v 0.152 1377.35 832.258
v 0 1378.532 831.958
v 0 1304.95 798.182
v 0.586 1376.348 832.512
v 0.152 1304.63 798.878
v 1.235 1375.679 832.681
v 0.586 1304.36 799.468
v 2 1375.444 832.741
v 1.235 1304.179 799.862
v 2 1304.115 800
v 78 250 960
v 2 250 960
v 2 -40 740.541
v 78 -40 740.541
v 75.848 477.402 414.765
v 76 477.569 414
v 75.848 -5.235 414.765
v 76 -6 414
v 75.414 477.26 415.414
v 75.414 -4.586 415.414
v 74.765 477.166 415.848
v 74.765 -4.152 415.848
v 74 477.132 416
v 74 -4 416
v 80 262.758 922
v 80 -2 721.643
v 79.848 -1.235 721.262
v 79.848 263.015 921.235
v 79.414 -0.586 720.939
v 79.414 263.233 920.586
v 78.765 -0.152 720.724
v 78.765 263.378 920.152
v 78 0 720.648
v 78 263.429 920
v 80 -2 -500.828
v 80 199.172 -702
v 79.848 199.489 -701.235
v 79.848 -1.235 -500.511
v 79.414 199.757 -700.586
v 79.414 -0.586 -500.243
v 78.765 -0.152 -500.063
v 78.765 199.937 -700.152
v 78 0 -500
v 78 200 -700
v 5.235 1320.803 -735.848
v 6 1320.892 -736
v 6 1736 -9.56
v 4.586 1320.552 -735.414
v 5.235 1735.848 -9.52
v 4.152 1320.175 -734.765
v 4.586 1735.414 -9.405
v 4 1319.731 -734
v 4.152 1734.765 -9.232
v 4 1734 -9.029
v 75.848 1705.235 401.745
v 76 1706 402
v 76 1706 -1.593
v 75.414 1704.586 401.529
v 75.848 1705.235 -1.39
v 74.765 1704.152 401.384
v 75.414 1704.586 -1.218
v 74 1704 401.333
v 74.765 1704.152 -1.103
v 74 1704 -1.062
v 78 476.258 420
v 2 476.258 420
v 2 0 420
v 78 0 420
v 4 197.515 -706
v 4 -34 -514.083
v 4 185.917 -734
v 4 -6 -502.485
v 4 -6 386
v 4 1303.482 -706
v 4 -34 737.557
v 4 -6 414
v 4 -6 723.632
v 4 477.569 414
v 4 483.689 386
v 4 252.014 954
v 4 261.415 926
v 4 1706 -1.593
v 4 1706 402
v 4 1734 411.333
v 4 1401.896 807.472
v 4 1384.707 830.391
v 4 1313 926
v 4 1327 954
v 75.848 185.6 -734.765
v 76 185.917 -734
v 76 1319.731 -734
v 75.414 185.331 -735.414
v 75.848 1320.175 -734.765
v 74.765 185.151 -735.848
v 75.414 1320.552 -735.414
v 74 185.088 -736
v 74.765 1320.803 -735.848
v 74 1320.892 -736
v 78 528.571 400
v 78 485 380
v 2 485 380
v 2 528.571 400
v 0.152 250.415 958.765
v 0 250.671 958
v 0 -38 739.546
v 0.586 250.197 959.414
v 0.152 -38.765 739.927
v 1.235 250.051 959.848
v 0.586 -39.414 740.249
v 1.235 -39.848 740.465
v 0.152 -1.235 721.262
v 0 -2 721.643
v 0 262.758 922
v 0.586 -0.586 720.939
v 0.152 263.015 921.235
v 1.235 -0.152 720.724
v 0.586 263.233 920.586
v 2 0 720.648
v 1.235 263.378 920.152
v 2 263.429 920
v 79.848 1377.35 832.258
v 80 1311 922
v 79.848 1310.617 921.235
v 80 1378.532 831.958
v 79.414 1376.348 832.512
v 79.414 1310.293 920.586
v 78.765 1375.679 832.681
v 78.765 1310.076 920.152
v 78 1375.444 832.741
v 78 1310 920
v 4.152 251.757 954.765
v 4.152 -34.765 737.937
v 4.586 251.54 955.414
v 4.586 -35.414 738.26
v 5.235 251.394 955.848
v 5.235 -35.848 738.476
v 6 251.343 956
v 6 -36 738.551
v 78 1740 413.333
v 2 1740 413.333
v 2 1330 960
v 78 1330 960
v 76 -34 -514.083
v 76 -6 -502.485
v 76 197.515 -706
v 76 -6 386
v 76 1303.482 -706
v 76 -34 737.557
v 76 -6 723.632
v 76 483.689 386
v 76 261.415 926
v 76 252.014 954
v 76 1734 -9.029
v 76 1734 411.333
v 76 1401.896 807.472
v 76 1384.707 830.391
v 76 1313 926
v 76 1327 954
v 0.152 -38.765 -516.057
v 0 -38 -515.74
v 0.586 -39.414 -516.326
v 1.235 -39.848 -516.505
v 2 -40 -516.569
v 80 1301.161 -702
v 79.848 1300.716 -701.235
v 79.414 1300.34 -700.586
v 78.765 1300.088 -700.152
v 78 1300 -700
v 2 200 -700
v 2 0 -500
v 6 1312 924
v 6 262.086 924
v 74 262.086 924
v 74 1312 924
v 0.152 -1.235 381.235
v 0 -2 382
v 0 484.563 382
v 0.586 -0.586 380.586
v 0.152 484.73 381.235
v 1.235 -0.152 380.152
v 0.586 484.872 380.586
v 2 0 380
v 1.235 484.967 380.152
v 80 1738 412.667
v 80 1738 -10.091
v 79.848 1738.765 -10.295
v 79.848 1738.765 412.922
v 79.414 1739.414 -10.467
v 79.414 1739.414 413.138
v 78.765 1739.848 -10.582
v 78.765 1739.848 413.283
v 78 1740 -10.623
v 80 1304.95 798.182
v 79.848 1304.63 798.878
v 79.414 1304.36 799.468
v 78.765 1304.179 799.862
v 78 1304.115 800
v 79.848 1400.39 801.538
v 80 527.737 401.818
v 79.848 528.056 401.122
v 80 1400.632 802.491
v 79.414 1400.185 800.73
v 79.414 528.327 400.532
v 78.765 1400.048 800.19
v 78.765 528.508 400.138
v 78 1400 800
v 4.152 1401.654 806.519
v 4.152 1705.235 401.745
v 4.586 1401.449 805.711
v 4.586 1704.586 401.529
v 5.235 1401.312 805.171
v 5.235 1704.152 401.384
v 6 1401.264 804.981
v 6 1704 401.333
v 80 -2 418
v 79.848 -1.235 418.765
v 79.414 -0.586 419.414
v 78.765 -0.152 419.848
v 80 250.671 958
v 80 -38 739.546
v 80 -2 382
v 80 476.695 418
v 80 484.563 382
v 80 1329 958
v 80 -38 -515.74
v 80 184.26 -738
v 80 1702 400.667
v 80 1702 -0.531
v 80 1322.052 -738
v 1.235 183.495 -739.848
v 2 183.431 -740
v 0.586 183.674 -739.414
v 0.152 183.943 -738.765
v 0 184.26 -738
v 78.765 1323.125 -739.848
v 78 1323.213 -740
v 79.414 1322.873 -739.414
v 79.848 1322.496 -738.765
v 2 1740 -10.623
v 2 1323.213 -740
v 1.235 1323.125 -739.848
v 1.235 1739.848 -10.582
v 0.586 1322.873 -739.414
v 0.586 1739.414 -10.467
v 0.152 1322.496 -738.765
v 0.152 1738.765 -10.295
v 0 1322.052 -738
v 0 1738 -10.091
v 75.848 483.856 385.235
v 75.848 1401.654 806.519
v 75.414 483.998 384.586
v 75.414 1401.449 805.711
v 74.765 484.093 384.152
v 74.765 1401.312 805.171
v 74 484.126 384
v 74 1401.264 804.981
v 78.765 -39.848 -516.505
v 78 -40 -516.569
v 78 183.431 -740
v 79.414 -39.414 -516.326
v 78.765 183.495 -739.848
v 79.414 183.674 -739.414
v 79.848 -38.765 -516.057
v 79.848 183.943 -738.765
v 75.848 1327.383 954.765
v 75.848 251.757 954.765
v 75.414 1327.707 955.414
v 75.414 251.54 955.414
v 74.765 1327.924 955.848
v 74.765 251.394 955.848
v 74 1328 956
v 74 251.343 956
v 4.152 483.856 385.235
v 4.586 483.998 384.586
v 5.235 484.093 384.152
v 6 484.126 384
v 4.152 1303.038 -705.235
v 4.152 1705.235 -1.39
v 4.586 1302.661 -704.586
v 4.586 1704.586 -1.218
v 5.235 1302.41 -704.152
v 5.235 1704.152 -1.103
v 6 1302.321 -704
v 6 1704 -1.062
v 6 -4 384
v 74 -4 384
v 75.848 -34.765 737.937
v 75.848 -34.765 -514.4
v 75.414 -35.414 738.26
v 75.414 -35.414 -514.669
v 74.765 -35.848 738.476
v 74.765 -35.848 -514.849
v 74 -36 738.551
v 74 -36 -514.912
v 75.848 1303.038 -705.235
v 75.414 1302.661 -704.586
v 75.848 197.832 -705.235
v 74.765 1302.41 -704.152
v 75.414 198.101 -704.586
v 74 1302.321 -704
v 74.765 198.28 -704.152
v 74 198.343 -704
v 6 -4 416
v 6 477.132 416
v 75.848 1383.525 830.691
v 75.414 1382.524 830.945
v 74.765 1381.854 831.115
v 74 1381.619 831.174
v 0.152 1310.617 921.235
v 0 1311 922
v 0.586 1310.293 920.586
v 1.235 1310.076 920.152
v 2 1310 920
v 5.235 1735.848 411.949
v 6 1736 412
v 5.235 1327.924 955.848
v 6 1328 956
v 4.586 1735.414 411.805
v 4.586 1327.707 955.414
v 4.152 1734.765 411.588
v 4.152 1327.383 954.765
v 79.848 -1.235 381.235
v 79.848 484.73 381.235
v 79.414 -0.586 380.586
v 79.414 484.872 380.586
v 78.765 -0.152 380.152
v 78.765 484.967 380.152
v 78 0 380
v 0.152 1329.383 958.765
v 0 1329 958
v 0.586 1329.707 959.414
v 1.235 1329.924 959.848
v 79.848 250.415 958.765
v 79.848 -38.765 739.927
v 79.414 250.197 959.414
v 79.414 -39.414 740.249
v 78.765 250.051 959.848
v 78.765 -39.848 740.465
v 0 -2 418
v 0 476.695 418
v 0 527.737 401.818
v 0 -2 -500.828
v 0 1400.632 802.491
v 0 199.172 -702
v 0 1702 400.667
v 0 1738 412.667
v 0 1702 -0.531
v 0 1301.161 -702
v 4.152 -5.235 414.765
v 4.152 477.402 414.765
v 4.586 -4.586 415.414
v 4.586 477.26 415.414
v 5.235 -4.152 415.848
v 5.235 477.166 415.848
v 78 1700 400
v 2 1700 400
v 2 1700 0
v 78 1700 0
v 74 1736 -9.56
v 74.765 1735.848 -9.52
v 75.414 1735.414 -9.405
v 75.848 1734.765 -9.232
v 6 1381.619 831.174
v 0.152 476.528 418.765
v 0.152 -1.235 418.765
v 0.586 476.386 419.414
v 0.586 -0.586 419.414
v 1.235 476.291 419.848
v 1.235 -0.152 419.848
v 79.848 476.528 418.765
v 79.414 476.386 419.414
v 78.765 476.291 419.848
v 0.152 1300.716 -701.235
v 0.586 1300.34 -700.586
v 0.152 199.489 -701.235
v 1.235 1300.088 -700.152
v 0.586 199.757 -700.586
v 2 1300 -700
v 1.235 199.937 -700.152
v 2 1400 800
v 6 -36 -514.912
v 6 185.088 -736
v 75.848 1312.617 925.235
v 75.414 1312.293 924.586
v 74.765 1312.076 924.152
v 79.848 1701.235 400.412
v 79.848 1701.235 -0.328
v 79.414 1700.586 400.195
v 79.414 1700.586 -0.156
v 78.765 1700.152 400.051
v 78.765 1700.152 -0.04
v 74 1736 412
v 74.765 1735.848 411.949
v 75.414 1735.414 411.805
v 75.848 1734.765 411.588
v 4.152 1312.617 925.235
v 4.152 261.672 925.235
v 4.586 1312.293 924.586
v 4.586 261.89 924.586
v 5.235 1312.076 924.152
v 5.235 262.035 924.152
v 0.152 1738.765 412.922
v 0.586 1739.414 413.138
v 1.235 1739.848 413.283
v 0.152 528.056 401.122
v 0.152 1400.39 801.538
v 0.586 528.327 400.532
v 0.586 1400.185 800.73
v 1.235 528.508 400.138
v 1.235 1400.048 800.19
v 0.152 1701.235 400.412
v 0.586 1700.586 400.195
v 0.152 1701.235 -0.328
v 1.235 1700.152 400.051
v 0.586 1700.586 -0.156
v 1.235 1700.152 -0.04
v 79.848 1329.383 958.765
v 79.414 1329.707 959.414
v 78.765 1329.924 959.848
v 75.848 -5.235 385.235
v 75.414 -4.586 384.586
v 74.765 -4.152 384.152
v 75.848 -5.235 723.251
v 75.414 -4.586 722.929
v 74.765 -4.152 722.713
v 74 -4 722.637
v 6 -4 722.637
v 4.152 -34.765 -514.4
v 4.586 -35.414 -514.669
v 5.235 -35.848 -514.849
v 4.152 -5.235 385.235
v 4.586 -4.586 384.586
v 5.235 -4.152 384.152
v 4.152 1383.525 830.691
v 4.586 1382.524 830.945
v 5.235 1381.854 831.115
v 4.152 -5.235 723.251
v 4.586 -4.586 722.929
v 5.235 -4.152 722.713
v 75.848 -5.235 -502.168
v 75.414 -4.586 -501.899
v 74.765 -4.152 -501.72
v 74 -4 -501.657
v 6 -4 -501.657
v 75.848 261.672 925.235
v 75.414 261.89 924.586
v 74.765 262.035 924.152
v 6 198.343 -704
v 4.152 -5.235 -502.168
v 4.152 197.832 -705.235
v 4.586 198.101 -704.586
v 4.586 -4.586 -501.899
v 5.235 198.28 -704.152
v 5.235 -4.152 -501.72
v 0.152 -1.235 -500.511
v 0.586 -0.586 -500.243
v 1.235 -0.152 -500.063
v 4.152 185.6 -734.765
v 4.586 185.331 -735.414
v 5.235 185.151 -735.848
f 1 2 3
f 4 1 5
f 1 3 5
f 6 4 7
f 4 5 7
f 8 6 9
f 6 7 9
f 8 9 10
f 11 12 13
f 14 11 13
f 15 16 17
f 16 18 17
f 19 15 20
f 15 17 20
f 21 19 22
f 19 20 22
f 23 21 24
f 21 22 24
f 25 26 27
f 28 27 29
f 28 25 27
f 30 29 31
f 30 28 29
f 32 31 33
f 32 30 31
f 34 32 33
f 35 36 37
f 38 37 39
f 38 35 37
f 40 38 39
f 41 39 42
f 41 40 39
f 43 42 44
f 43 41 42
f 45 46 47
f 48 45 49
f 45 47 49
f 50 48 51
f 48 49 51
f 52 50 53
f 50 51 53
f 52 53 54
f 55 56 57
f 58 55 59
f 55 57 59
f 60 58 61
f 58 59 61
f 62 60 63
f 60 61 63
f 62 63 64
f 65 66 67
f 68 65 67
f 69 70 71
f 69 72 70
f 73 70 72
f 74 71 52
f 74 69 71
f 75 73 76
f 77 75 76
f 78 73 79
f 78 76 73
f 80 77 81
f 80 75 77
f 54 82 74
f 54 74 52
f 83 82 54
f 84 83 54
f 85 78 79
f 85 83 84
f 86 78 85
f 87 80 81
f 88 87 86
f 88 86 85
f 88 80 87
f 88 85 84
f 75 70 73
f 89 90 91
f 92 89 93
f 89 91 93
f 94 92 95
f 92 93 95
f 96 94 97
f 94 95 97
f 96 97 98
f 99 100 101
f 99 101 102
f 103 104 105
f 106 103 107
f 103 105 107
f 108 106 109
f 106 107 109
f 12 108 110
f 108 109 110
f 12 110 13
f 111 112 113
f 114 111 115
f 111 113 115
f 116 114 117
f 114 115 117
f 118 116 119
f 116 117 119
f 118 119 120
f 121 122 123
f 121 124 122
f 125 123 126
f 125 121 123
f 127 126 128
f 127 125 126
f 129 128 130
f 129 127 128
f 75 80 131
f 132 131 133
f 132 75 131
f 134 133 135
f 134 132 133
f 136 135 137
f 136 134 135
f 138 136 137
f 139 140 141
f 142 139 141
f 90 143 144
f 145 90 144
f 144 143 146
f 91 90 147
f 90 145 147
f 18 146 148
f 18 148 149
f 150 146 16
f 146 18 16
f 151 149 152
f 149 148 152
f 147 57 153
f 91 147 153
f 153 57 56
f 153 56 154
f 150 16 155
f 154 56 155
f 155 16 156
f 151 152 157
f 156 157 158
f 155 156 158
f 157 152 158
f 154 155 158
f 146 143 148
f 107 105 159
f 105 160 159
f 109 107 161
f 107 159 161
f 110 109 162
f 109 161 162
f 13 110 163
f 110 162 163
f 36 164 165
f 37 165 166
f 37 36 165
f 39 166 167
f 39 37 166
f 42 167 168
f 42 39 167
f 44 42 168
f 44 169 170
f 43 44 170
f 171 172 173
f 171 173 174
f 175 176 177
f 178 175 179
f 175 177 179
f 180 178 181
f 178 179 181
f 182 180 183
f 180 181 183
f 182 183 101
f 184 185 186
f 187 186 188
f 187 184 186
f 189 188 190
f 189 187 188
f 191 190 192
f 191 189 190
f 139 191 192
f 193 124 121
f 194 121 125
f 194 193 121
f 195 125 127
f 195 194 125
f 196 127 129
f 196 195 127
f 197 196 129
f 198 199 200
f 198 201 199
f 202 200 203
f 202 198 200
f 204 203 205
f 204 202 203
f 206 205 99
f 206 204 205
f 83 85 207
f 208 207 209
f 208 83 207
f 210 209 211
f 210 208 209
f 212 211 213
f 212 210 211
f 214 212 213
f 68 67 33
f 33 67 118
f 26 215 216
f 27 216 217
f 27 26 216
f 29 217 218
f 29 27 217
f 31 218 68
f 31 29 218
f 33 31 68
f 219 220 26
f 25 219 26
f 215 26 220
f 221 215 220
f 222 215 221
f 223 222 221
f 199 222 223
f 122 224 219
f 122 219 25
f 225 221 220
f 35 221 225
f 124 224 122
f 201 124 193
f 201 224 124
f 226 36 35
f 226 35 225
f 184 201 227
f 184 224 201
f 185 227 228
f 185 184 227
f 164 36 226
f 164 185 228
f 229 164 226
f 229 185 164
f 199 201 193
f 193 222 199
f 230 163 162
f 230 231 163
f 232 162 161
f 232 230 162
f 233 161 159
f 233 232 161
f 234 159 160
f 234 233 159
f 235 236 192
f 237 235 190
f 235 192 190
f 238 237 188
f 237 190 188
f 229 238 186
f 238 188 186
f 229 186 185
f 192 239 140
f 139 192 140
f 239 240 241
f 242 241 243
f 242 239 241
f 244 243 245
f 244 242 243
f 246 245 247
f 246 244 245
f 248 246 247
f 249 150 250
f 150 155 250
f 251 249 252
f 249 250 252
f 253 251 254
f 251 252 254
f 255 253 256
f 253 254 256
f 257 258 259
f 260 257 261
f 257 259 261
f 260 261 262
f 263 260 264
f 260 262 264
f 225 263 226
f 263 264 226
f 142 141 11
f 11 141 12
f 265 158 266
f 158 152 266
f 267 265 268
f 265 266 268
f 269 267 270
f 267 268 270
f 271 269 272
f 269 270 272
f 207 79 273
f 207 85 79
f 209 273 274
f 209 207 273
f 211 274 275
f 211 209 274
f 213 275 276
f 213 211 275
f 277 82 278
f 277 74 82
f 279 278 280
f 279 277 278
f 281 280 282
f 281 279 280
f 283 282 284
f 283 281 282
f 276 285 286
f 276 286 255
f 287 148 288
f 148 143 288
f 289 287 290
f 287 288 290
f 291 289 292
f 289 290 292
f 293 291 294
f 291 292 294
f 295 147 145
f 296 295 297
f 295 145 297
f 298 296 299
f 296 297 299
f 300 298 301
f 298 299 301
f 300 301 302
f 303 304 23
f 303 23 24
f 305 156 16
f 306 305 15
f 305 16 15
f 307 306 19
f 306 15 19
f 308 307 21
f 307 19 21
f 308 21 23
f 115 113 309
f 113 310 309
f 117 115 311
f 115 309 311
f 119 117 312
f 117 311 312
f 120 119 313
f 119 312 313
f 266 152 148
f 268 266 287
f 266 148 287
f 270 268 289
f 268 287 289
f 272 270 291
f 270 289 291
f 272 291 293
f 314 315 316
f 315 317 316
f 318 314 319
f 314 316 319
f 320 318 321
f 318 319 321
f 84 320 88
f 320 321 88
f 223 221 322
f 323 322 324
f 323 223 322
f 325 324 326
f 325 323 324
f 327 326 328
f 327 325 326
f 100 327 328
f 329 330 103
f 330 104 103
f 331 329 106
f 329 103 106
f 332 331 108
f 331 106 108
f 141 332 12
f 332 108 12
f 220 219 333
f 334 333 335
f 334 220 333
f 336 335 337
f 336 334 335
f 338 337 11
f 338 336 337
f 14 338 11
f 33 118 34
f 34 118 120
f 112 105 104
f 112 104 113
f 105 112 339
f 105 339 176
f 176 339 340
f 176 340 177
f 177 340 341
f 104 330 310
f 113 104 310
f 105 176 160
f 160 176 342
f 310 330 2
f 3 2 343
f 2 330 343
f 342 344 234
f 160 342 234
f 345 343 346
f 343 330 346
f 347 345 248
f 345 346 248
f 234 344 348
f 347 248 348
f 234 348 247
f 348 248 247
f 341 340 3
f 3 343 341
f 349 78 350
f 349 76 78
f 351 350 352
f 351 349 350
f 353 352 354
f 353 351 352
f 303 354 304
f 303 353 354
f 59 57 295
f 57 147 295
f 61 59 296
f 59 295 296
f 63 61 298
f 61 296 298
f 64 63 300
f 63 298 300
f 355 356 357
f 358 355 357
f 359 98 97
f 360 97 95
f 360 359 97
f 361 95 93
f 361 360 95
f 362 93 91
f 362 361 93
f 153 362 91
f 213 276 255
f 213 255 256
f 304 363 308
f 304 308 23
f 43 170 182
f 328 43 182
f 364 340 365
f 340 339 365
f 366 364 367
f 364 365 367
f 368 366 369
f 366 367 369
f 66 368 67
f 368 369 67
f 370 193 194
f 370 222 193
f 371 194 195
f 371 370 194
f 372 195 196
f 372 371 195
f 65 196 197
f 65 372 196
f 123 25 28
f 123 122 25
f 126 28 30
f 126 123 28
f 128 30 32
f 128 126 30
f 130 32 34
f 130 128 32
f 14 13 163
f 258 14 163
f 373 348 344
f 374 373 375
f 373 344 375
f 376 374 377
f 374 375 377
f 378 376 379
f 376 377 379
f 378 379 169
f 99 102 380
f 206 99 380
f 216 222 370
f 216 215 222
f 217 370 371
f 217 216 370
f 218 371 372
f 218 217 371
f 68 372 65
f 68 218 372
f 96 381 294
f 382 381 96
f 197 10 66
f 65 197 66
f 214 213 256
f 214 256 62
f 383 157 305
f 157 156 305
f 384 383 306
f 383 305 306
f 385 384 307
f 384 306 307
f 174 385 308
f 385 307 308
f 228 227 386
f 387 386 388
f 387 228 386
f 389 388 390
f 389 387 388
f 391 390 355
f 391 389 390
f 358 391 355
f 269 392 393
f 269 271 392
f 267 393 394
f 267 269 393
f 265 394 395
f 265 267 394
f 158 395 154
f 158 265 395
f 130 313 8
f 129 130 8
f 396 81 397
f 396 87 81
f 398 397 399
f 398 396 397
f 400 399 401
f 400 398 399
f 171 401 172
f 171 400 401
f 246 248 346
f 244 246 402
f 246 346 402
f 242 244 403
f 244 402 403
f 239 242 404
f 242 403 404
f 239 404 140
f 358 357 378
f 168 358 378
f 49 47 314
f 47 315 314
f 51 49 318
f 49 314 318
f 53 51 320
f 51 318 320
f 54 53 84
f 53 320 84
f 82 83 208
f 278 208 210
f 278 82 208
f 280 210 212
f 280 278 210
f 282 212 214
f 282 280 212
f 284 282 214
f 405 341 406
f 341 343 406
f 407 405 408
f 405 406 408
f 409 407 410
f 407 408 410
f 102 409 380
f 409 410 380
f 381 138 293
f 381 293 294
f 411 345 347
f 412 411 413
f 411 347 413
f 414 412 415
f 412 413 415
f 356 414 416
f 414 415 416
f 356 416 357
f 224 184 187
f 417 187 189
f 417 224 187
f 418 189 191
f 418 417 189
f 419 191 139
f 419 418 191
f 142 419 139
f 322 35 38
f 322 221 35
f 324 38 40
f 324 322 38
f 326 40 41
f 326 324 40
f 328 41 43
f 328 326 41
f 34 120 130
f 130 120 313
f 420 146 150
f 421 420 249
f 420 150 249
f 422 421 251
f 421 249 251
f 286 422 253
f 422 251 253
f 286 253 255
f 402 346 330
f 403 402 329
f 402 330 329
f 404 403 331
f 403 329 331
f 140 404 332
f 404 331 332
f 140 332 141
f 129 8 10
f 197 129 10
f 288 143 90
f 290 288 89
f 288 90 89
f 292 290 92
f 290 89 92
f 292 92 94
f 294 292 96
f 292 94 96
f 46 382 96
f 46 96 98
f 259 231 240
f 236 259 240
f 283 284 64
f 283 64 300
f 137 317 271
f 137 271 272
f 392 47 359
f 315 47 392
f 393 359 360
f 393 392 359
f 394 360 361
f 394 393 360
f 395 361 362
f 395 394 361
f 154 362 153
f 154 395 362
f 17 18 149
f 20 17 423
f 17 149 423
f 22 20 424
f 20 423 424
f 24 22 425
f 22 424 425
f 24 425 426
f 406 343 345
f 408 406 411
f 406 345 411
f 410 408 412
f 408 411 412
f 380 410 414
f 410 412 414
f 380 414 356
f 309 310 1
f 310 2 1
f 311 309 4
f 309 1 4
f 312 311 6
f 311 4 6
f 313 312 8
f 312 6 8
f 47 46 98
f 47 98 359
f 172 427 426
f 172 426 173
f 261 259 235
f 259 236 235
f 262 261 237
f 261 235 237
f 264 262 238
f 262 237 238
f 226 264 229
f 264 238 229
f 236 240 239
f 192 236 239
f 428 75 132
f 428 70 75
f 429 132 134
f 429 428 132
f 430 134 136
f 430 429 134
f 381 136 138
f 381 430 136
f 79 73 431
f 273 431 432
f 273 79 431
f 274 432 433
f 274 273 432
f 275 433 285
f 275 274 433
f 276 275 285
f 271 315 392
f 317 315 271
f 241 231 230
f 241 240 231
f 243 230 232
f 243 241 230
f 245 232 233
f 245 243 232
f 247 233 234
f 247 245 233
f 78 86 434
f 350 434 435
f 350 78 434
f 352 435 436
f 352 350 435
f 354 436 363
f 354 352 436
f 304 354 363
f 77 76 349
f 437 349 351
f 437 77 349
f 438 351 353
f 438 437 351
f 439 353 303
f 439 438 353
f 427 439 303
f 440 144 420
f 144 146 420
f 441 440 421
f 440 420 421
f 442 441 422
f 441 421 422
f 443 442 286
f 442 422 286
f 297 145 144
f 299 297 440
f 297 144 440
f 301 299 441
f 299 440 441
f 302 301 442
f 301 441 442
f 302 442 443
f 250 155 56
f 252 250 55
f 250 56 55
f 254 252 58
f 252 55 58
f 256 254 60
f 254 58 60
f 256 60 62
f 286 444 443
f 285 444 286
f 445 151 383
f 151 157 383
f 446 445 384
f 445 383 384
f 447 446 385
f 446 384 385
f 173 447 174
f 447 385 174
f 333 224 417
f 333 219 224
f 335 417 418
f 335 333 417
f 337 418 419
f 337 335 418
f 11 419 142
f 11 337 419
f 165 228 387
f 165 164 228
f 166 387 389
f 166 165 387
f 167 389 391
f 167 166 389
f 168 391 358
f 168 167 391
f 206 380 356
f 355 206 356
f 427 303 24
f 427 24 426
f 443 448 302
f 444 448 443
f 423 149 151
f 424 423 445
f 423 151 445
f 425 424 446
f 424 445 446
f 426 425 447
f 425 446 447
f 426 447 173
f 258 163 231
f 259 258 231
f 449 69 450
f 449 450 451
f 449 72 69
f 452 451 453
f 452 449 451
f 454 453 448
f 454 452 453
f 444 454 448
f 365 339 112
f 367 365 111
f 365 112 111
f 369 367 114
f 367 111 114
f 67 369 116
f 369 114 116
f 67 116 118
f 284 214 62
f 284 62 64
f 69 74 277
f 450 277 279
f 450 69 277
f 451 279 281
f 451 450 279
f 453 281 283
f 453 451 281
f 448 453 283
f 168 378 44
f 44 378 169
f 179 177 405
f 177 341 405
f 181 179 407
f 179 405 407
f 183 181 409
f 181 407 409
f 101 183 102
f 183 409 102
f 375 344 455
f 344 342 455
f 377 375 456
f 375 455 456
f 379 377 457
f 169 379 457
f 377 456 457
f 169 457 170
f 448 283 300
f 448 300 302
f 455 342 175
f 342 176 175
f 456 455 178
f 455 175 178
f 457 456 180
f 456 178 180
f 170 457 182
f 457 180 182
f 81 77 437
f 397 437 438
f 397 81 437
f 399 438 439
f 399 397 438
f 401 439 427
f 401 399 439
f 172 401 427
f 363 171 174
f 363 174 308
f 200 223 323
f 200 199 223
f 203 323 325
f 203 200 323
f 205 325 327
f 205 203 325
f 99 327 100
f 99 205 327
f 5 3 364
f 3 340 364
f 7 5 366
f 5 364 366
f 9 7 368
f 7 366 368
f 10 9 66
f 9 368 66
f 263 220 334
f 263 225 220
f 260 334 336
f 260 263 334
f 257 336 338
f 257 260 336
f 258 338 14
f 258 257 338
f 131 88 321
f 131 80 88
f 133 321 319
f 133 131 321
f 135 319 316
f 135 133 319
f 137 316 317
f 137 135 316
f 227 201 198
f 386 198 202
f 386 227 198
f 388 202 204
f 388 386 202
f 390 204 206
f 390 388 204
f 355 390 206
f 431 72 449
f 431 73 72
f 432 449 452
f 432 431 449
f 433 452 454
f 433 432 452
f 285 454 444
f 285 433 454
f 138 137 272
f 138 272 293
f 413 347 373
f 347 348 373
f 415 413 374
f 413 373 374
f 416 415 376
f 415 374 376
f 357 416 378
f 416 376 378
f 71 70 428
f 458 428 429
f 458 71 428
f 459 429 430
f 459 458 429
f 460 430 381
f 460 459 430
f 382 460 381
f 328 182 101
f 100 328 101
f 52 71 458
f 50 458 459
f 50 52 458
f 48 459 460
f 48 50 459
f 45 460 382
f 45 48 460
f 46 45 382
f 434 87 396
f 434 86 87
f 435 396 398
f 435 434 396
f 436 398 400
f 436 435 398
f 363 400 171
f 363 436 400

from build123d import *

# Parameters (mm, degrees)
BOSS_EXTRU_1_DEPTH = 80
COQUE1_START       = 4
COQUE1_DEPTH       = 72
CONG_2_R           = 2


# Read off the part's stored shape, not the designer's step: Coque1
with BuildPart() as part:
    # Esquisse1 → Boss.-Extru.1 (new body)
    with BuildSketch(Plane(origin=(0, 0, 0), x_dir=(0, 0, -1), z_dir=(1, 0, 0))):
        Polygon((740, 183.431457505), (740, 1323.212901419), (10.622577483, 1740), (-413.333333333, 1740), (-840, 1420), (-960, 1330), (-960, 250), (-740.540540541, -40), (-419.892357873, -40), (0, -40), (516.568542495, -40), align=None)
        Polygon((-420, 476.25814746), (-420, 26.428571429), (-420, 0), (-450.162628143, 0), (-554.571588527, 0), (-720.648182668, 0), (-920, 263.429187189), (-920, 1310), (-832.74112038, 1375.444159715), (-800, 1304.115290317), align=None, mode=Mode.SUBTRACT)
        Polygon((500, 0), (0, 0), (-380, 0), (-380, 485), (-400, 528.571428571), (-800, 1400), (-400, 1700), (0, 1700), (700, 1300), (700, 200), align=None, mode=Mode.SUBTRACT)
    extrude(amount=BOSS_EXTRU_1_DEPTH)

    # Coque1 outline → Coque1 (cut)
    with BuildSketch(Plane.YZ.offset(COQUE1_START)):
        Polygon((1736, -9.560319735), (1736, 412), (1328, 956), (251.342918719, 956), (-36, 738.551304753), (-36, -514.911688245), (185.088311755, -736), (1320.891611277, -736), align=None)
        Polygon((484.125814746, 384), (1401.263928167, 804.981429111), (1704, 401.333333333), (1704, -1.062257748), (1302.321290142, -704), (198.343145751, -704), (-4, -501.656854249), (-4, 384), align=None, mode=Mode.SUBTRACT)
        Polygon((262.08626847, 924), (1312, 924), (1381.619255939, 831.174325415), (477.132332714, 416), (-4, 416), (-4, 722.637418455), align=None, mode=Mode.SUBTRACT)
    extrude(amount=COQUE1_DEPTH, mode=Mode.SUBTRACT)

    # Congé2
    cong_2_edges = [part.edges().sort_by_distance(p)[0] for p in [
        (80, 942.5, 590),
        (80, 1550, 600),
        (80, 1700, 200),
        (0, 786.714593595, 920),
        (0, 131.714593595, 820.324091334),
        (80, 1500, -350),
        (0, 0, 570.324091334),
        (0, 238.12907373, 420),
        (0, 925.851153588, 626.37056019),
        (0, 1342.722079858, 876.37056019),
        (0, 1740, 201.355377925),
        (0, 1531.606450709, -375.311288741),
        (0, 753.322179462, -740),
        (80, 750, -700),
        (0, 71.715728753, -628.284271247),
        (0, -40, 111.985999023),
        (0, 105, 850.27027027),
        (0, 790, 960),
        (0, 1535, 686.666666667),
        (0, 0, -60),
        (0, 100, -600),
        (80, 100, -600),
        (0, 750, -700),
        (0, 1500, -350),
        (0, 1700, 200),
        (0, 1550, 600),
        (0, 942.5, 590),
        (0, 242.5, 380),
        (80, 0, -60),
        (80, 1535, 686.666666667),
        (80, 790, 960),
        (80, 105, 850.27027027),
        (80, -40, 111.985999023),
        (80, 71.715728753, -628.284271247),
        (80, 753.322179462, -740),
        (80, 1531.606450709, -375.311288741),
        (80, 242.5, 380),
        (76, 1346.80962797, 877.587162708),
        (4, 929.375794326, 623.587162708),
        (76, 236.566166357, 416),
        (76, -4, 569.318709227),
        (80, 1740, 201.355377925),
        (76, 129.043134235, 823.318709227),
        (76, 1532, 684),
        (76, 789.671459359, 956),
        (76, 107.67145936, 847.275652377),
        (76, -36, 111.819808254),
        (4, 74.544155878, -625.455844123),
        (76, 752.989961516, -736),
        (76, 1528.445805639, -372.780159868),
        (76, 240.062907373, 384),
        (76, 942.694871456, 594.490714556),
        (76, 1552.631964083, 603.157381222),
        (4, 1704, 200.135537793),
        (4, 1503.160645071, -352.531128874),
        (4, 750.332217947, -704),
        (76, 97.171572876, -602.828427124),
        (76, 1736, 201.219840132),
        (76, -4, -58.828427125),
        (76, 787.043134235, 924),
        (76, 1704, 200.135537793),
        (76, 1503.160645071, -352.531128874),
        (76, 750.332217947, -704),
        (76, 74.544155878, -625.455844123),
        (80, 1342.722079858, 876.37056019),
        (76, 929.375794326, 623.587162708),
        (4, 240.062907373, 384),
        (4, -4, -58.828427125),
        (4, 97.171572876, -602.828427124),
        (4, 1552.631964083, 603.157381222),
        (4, 942.694871456, 594.490714556),
        (4, 1532, 684),
        (4, 1736, 201.219840132),
        (4, 1528.445805639, -372.780159868),
        (4, 752.989961516, -736),
        (4, -36, 111.819808254),
        (4, 107.67145936, 847.275652377),
        (4, 789.671459359, 956),
        (4, 1346.80962797, 877.587162708),
        (4, 787.043134235, 924),
        (4, 129.043134235, 823.318709227),
        (4, -4, 569.318709227),
        (4, 236.566166357, 416),
        (80, 925.851153588, 626.37056019),
        (80, 238.12907373, 420),
        (80, 0, 570.324091334),
        (80, 131.714593595, 820.324091334),
        (80, 786.714593595, 920),
    ]]
    fillet(cong_2_edges, radius=CONG_2_R)


solid = part.part
